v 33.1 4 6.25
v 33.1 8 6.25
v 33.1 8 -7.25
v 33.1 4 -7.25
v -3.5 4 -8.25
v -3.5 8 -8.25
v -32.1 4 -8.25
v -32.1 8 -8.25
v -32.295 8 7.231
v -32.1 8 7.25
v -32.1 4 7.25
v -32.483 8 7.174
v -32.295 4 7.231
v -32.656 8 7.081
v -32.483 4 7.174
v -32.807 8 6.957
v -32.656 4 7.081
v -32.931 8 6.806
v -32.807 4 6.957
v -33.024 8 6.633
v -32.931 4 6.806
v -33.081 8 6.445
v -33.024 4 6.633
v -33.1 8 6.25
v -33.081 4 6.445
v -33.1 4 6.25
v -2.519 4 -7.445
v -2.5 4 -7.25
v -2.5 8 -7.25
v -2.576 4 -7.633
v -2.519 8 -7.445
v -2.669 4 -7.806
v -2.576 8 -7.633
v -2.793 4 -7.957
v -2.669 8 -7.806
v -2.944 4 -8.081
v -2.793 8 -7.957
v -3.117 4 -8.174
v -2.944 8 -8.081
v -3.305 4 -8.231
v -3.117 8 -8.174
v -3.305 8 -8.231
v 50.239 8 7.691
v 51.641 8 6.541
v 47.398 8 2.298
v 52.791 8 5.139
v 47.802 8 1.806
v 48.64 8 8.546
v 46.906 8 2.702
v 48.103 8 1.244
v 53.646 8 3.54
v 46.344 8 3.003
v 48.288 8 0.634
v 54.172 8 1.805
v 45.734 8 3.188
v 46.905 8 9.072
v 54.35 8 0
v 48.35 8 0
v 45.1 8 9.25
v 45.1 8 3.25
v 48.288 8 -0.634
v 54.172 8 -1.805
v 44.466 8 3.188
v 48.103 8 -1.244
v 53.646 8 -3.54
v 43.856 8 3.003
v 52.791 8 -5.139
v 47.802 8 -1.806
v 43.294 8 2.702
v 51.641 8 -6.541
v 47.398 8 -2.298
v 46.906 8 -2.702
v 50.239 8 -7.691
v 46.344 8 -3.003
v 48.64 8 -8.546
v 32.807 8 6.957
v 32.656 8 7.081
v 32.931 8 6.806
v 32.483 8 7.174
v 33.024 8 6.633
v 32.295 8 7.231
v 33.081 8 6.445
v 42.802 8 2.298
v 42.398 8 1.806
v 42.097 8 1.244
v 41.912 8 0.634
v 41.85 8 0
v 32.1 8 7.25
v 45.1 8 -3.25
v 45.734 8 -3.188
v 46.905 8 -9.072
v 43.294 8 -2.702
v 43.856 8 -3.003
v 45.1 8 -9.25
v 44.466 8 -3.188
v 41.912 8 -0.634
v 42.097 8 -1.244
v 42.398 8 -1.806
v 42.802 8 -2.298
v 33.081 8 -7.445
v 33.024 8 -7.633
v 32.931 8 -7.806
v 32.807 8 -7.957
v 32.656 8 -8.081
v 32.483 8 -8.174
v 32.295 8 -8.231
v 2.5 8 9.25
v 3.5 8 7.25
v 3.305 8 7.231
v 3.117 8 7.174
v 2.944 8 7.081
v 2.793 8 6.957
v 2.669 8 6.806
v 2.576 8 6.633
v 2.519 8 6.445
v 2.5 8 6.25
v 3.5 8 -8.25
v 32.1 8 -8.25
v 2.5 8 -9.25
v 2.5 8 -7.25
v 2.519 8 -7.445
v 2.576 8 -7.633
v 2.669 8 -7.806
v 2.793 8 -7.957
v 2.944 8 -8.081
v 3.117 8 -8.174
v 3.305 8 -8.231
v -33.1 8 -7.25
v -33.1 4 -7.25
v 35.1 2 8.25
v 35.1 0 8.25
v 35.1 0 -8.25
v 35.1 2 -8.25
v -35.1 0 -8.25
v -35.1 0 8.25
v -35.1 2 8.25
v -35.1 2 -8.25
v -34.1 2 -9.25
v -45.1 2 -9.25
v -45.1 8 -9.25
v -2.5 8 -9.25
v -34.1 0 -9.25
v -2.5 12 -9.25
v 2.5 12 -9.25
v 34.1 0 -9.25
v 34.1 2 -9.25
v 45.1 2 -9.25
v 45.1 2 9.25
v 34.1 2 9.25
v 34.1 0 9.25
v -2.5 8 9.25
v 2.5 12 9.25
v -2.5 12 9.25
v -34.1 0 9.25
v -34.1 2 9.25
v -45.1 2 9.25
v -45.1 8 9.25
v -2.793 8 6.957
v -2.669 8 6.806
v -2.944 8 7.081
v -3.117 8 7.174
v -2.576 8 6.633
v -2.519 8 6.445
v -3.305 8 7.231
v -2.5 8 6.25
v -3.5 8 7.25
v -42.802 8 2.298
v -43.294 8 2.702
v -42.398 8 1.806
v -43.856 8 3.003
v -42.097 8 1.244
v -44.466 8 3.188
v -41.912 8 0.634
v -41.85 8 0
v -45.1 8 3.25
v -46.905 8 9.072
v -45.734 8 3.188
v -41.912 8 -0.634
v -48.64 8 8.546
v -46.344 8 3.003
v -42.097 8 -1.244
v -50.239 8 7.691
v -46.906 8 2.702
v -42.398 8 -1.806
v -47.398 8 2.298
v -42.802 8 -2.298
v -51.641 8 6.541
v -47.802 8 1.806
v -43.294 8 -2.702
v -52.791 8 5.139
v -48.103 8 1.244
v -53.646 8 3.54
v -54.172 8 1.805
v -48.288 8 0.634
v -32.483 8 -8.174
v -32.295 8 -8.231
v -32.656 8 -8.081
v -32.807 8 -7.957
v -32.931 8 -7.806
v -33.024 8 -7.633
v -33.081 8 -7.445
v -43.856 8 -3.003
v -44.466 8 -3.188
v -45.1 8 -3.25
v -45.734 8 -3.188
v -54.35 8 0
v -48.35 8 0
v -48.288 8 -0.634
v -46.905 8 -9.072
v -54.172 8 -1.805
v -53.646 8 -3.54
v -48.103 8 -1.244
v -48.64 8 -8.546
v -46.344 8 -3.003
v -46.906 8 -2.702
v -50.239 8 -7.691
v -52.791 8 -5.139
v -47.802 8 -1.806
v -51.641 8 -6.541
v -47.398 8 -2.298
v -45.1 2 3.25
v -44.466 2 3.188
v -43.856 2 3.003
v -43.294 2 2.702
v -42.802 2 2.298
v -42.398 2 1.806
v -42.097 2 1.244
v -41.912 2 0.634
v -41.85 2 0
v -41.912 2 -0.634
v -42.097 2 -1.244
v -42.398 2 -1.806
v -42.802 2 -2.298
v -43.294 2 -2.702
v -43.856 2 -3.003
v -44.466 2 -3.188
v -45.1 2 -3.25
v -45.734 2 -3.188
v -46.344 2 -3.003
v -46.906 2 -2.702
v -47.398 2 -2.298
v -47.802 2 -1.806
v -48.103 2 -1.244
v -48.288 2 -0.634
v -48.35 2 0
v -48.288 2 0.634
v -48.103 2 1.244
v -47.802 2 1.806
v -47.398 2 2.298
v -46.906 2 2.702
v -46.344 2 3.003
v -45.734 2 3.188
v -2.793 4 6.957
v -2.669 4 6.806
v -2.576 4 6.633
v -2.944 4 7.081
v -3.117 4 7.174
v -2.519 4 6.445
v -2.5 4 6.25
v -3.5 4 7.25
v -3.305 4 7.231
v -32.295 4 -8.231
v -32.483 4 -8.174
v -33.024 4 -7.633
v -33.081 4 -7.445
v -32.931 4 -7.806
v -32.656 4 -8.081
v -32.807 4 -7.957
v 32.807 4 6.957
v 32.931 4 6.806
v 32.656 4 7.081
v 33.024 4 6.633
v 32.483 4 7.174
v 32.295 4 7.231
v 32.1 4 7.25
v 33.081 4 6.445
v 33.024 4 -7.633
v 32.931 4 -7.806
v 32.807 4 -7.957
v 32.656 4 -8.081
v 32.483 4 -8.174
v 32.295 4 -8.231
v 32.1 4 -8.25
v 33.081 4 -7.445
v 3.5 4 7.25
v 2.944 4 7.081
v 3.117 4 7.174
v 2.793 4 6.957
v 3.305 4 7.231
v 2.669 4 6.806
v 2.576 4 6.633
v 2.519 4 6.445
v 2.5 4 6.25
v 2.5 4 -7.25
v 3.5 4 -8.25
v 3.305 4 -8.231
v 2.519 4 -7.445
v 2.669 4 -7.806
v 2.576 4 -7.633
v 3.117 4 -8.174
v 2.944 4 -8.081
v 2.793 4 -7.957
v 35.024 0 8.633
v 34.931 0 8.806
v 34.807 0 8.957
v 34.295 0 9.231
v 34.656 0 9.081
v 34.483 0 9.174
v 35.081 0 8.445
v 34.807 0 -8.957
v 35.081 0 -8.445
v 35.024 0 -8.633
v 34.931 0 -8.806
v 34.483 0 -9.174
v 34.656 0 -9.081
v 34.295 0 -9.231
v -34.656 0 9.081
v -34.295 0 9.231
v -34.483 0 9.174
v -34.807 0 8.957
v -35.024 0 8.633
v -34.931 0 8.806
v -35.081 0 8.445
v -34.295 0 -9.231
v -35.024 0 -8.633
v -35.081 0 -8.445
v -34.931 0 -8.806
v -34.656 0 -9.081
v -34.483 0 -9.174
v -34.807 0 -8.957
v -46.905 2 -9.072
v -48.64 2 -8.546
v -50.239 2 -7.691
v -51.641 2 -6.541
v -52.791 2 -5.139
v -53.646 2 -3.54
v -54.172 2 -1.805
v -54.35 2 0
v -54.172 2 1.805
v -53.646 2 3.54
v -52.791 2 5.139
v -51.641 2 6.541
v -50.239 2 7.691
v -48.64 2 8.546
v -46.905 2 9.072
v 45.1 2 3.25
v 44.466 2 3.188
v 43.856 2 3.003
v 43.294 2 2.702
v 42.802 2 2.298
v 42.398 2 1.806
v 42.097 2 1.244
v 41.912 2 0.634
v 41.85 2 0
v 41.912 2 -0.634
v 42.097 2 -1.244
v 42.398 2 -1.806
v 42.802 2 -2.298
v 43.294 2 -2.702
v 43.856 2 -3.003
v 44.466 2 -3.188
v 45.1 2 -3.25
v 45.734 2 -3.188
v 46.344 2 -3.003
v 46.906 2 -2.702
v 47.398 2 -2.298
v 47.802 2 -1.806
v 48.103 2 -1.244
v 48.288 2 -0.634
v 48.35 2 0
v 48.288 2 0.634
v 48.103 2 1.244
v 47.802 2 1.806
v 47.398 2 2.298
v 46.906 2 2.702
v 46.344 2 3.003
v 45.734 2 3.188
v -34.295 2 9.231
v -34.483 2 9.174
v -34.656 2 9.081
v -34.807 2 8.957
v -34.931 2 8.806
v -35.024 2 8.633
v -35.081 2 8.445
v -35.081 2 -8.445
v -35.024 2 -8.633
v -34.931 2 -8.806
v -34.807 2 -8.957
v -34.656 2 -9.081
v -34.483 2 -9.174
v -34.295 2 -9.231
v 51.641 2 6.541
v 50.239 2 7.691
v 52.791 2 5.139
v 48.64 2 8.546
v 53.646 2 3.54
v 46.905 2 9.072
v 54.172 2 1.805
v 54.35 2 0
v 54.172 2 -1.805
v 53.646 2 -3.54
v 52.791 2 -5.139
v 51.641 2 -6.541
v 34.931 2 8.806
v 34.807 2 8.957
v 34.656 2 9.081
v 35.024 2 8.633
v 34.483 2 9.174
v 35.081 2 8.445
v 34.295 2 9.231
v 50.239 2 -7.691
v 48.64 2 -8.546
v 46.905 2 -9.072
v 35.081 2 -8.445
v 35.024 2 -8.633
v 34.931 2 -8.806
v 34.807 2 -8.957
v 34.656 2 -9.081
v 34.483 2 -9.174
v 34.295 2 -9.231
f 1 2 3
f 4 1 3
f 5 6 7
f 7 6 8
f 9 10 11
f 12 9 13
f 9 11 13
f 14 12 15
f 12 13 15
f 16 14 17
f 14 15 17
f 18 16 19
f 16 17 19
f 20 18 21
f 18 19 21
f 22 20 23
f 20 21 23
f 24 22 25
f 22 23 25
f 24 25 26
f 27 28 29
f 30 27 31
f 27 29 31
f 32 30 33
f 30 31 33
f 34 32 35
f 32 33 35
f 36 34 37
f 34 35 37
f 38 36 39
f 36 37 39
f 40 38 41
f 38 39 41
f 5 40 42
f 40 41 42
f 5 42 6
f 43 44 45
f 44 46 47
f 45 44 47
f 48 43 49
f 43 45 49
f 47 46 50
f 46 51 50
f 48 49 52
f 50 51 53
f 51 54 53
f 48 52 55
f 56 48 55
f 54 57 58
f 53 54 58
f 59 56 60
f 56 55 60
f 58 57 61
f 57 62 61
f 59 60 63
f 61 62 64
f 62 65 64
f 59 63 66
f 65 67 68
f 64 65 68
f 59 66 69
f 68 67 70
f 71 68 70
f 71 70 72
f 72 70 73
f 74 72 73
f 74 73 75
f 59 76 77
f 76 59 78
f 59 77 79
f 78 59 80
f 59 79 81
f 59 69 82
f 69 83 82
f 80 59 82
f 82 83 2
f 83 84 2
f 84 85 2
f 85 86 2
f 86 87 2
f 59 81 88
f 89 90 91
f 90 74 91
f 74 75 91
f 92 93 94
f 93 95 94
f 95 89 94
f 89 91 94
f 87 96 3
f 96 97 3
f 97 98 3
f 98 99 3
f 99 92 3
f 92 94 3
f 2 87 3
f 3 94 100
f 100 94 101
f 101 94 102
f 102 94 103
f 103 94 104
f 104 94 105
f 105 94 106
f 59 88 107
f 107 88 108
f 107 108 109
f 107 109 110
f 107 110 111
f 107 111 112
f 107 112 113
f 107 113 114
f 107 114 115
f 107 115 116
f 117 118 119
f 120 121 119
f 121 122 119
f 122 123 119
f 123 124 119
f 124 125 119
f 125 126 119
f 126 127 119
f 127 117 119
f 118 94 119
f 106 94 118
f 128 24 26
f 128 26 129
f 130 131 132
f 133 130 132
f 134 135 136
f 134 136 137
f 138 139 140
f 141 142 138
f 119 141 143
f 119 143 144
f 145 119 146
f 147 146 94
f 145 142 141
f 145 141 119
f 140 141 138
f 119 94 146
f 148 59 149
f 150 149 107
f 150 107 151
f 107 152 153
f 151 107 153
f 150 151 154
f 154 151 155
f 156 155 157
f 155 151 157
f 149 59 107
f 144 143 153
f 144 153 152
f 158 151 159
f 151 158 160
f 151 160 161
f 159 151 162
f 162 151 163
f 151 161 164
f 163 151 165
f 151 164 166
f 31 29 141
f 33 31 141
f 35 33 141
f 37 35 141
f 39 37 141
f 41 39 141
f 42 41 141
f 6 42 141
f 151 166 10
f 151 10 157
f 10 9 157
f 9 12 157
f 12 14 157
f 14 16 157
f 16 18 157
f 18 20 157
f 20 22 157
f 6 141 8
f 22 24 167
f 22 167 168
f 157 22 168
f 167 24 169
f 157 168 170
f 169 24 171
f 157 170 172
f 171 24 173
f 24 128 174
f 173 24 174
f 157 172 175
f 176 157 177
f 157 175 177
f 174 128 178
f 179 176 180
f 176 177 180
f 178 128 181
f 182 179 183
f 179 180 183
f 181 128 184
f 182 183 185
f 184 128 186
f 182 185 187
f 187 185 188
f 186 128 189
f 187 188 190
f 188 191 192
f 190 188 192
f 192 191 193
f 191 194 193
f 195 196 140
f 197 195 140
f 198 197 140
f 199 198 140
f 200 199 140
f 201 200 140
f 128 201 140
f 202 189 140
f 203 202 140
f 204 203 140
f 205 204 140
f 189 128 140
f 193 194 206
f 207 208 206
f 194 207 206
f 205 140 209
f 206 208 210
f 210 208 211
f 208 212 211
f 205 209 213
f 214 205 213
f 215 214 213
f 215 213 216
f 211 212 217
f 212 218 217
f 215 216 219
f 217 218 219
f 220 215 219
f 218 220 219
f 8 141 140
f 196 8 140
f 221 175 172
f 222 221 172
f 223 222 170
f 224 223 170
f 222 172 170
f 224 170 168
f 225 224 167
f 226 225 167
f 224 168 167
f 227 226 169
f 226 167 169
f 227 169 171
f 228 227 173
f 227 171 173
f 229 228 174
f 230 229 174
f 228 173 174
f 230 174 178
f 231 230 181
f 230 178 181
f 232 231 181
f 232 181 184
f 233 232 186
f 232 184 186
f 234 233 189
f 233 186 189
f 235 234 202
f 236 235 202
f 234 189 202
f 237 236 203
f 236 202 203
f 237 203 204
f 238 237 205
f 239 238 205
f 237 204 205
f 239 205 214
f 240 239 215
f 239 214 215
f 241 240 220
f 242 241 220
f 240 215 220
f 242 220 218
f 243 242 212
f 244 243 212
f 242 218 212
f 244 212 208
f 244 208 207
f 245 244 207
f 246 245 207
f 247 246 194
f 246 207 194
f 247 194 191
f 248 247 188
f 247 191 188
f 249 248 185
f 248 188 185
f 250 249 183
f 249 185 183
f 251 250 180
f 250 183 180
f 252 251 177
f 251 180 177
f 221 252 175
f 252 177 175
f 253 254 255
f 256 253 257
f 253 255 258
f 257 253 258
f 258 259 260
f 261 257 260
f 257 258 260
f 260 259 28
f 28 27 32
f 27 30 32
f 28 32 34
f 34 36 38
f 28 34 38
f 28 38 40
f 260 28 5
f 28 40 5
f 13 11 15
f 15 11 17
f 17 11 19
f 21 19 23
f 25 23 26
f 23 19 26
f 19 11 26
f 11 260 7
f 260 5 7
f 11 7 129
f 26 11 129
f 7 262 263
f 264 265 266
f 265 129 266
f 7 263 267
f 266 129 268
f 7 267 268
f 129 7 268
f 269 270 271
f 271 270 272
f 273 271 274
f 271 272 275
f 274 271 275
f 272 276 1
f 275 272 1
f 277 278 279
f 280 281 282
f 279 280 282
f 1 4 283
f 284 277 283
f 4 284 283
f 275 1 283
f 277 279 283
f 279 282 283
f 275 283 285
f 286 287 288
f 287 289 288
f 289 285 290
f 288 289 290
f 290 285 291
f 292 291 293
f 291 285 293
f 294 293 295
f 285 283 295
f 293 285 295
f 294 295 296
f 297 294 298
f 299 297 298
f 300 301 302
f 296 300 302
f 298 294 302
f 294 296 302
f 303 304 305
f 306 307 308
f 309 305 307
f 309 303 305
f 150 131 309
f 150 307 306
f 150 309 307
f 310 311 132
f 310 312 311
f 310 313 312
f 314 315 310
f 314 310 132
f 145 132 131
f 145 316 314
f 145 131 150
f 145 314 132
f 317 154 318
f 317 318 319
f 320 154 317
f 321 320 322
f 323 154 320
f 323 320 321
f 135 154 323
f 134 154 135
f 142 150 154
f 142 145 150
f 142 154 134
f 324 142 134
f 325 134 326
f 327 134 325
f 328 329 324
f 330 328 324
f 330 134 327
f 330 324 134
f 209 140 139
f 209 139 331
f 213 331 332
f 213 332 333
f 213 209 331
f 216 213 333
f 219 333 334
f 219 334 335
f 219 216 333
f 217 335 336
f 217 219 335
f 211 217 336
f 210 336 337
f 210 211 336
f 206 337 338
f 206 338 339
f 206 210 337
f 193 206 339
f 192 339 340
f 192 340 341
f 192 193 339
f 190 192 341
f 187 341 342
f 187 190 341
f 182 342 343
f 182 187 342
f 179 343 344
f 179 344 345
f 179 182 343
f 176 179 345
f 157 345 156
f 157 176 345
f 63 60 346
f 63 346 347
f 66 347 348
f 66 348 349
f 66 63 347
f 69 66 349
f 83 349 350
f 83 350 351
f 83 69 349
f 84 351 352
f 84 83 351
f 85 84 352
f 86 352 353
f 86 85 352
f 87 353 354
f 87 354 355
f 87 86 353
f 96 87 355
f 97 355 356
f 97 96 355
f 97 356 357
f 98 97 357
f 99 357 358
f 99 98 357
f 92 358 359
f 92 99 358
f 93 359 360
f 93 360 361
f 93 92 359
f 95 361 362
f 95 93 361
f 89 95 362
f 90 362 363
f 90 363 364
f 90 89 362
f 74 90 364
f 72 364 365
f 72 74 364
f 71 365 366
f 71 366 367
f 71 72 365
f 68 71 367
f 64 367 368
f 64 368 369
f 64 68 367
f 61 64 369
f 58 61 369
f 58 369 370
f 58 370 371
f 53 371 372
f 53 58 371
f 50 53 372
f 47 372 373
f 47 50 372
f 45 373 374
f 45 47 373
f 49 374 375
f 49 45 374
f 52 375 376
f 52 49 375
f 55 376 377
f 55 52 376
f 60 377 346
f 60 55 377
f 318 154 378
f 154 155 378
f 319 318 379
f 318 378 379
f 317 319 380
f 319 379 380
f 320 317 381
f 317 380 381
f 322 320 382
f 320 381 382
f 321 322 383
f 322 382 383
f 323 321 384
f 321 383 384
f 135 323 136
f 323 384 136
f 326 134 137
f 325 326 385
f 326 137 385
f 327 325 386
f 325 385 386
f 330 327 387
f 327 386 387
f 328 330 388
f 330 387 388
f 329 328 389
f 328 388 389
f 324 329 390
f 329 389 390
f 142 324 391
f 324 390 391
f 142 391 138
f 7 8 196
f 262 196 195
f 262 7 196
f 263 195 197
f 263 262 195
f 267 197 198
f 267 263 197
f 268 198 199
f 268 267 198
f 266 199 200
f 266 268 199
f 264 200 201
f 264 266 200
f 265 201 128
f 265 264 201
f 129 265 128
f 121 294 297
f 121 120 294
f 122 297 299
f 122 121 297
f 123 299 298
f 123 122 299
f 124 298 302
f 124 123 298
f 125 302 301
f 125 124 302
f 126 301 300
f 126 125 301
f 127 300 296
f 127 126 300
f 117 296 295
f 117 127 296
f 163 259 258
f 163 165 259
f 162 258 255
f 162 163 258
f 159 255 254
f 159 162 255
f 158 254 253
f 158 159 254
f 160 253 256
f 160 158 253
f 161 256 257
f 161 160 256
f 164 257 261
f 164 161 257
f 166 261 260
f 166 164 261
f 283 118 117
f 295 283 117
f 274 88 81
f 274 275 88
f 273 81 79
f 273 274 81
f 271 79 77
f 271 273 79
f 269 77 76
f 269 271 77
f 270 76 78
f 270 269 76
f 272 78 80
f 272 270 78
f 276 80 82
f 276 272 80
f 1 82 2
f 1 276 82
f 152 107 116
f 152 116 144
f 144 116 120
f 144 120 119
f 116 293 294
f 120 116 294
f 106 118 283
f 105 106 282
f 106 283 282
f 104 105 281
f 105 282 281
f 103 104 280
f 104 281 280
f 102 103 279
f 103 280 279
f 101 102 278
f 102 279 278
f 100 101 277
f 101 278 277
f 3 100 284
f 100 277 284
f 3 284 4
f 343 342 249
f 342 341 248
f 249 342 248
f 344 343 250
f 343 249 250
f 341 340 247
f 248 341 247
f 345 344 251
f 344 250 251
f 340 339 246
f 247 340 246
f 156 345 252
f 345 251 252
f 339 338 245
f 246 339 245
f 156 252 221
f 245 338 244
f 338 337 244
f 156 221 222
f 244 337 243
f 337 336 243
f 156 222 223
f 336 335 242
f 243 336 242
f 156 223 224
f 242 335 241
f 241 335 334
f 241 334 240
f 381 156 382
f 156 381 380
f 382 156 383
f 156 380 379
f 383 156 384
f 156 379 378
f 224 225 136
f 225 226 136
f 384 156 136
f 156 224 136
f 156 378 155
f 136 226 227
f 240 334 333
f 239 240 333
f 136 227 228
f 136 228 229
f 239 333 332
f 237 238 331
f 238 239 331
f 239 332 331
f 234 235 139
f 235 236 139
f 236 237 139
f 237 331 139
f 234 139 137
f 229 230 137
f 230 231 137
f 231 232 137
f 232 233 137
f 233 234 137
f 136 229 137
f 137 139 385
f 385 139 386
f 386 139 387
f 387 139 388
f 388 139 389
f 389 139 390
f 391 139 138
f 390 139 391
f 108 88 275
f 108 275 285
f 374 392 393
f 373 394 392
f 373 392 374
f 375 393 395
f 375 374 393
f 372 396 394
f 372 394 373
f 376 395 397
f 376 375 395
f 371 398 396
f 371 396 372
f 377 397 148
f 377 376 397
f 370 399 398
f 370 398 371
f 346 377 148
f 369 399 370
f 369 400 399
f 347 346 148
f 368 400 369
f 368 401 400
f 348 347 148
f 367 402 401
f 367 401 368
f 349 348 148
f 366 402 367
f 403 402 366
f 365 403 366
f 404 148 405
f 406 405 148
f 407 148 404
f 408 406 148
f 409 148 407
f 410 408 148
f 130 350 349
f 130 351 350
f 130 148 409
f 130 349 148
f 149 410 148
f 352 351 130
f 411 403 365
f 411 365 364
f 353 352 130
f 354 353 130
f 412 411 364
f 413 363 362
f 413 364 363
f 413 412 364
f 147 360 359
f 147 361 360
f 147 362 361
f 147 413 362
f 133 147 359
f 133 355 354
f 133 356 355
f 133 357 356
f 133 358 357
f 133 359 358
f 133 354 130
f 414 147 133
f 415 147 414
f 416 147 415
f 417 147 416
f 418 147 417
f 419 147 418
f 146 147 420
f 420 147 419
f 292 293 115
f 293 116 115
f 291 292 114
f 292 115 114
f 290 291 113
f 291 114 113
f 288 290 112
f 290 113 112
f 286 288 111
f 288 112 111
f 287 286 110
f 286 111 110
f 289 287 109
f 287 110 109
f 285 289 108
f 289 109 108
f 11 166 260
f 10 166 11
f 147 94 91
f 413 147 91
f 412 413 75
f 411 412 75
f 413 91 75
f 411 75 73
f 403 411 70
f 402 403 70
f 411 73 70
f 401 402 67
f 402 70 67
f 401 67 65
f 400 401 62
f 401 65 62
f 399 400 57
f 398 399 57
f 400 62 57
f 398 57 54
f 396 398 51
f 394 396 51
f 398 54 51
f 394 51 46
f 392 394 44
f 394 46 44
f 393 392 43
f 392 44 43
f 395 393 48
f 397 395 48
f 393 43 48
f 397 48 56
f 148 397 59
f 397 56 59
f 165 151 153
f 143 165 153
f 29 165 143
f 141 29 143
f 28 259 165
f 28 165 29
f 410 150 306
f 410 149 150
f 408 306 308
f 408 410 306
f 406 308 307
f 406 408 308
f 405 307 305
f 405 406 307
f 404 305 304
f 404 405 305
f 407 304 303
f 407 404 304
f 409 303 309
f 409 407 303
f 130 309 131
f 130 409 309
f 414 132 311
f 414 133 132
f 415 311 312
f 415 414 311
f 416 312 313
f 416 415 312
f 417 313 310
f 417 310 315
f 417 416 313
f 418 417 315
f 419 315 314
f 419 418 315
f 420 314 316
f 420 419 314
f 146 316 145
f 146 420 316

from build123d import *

# Parameters (mm, degrees)
SKETCH1_W           = 35.1
SKETCH1_H           = 18.5
BOSS_EXTRUDE1_DEPTH = 8
SKETCH10_R          = 3.25
BOLT_EXTRUDE_DEPTH  = 6
SKETCH7_W           = 33.1
SKETCH7_H           = 15.5
CUT_EXTRUDE5_DEPTH  = 4
SKETCH8_W           = 5
SKETCH8_H           = 18.5
BOSS_EXTRUDE3_DEPTH = 8
FILLET6_R           = 1


with BuildPart() as part:
    # Sketch1 → Boss-Extrude1 (new body)
    with BuildSketch(Plane(origin=(0, 0, 0), x_dir=(1, 0, 0), z_dir=(0, 1, 0))):
        with Locations((-17.55, 0)):
            Rectangle(SKETCH1_W, SKETCH1_H)
    extrude(amount=BOSS_EXTRUDE1_DEPTH)

    # Sketch10 → bolt extrude (add)
    with BuildSketch(Plane(origin=(0, 8, 0), x_dir=(1, 0, 0), z_dir=(0, 1, 0))):
        with BuildLine():
            Line((-35.1, 9.25), (-45.1, 9.25))
            ThreePointArc((-45.1, 9.25), (-54.35, 0), (-45.1, -9.25))
            Line((-45.1, -9.25), (-35.1, -9.25))
            Line((-35.1, -9.25), (-35.1, 9.25))
        make_face()
        with Locations(Location((-45.1, 0, 0), (0, 0, 270))):
            Circle(SKETCH10_R, mode=Mode.SUBTRACT)
    extrude(amount=-BOLT_EXTRUDE_DEPTH)

    # Sketch7 → Cut-Extrude5 (cut)
    with BuildSketch(Plane(origin=(0, 8, 0), x_dir=(1, 0, 0), z_dir=(0, 1, 0))):
        with Locations((-16.55, 0.5)):
            Rectangle(SKETCH7_W, SKETCH7_H)
    extrude(amount=-CUT_EXTRUDE5_DEPTH, mode=Mode.SUBTRACT)

    # Mirror1: part across plane


with BuildPart() as part_1:
    add(part.part)
    add(part.part.mirror(Plane(origin=(0, 0, 0), x_dir=(0, 0, 1), z_dir=(1, 0, 0))))

    # Sketch8 → Boss-Extrude3 (add)
    with BuildSketch(Plane(origin=(0, 4, 0), x_dir=(1, 0, 0), z_dir=(0, 1, 0))):
        Rectangle(SKETCH8_W, SKETCH8_H)
    extrude(amount=BOSS_EXTRUDE3_DEPTH)

    # Fillet6
    fillet6_edges = [part_1.edges().sort_by_distance(p)[0] for p in [
        (-35.1, 1, 9.25),
        (-35.1, 1, -9.25),
        (-33.1, 6, -8.25),
        (-33.1, 6, 7.25),
        (35.1, 1, -9.25),
        (35.1, 1, 9.25),
        (33.1, 6, -8.25),
        (33.1, 6, 7.25),
        (-2.5, 6, 7.25),
        (2.5, 6, 7.25),
        (2.5, 6, -8.25),
        (-2.5, 6, -8.25),
    ]]
    fillet(fillet6_edges, radius=FILLET6_R)


solid = part_1.part
